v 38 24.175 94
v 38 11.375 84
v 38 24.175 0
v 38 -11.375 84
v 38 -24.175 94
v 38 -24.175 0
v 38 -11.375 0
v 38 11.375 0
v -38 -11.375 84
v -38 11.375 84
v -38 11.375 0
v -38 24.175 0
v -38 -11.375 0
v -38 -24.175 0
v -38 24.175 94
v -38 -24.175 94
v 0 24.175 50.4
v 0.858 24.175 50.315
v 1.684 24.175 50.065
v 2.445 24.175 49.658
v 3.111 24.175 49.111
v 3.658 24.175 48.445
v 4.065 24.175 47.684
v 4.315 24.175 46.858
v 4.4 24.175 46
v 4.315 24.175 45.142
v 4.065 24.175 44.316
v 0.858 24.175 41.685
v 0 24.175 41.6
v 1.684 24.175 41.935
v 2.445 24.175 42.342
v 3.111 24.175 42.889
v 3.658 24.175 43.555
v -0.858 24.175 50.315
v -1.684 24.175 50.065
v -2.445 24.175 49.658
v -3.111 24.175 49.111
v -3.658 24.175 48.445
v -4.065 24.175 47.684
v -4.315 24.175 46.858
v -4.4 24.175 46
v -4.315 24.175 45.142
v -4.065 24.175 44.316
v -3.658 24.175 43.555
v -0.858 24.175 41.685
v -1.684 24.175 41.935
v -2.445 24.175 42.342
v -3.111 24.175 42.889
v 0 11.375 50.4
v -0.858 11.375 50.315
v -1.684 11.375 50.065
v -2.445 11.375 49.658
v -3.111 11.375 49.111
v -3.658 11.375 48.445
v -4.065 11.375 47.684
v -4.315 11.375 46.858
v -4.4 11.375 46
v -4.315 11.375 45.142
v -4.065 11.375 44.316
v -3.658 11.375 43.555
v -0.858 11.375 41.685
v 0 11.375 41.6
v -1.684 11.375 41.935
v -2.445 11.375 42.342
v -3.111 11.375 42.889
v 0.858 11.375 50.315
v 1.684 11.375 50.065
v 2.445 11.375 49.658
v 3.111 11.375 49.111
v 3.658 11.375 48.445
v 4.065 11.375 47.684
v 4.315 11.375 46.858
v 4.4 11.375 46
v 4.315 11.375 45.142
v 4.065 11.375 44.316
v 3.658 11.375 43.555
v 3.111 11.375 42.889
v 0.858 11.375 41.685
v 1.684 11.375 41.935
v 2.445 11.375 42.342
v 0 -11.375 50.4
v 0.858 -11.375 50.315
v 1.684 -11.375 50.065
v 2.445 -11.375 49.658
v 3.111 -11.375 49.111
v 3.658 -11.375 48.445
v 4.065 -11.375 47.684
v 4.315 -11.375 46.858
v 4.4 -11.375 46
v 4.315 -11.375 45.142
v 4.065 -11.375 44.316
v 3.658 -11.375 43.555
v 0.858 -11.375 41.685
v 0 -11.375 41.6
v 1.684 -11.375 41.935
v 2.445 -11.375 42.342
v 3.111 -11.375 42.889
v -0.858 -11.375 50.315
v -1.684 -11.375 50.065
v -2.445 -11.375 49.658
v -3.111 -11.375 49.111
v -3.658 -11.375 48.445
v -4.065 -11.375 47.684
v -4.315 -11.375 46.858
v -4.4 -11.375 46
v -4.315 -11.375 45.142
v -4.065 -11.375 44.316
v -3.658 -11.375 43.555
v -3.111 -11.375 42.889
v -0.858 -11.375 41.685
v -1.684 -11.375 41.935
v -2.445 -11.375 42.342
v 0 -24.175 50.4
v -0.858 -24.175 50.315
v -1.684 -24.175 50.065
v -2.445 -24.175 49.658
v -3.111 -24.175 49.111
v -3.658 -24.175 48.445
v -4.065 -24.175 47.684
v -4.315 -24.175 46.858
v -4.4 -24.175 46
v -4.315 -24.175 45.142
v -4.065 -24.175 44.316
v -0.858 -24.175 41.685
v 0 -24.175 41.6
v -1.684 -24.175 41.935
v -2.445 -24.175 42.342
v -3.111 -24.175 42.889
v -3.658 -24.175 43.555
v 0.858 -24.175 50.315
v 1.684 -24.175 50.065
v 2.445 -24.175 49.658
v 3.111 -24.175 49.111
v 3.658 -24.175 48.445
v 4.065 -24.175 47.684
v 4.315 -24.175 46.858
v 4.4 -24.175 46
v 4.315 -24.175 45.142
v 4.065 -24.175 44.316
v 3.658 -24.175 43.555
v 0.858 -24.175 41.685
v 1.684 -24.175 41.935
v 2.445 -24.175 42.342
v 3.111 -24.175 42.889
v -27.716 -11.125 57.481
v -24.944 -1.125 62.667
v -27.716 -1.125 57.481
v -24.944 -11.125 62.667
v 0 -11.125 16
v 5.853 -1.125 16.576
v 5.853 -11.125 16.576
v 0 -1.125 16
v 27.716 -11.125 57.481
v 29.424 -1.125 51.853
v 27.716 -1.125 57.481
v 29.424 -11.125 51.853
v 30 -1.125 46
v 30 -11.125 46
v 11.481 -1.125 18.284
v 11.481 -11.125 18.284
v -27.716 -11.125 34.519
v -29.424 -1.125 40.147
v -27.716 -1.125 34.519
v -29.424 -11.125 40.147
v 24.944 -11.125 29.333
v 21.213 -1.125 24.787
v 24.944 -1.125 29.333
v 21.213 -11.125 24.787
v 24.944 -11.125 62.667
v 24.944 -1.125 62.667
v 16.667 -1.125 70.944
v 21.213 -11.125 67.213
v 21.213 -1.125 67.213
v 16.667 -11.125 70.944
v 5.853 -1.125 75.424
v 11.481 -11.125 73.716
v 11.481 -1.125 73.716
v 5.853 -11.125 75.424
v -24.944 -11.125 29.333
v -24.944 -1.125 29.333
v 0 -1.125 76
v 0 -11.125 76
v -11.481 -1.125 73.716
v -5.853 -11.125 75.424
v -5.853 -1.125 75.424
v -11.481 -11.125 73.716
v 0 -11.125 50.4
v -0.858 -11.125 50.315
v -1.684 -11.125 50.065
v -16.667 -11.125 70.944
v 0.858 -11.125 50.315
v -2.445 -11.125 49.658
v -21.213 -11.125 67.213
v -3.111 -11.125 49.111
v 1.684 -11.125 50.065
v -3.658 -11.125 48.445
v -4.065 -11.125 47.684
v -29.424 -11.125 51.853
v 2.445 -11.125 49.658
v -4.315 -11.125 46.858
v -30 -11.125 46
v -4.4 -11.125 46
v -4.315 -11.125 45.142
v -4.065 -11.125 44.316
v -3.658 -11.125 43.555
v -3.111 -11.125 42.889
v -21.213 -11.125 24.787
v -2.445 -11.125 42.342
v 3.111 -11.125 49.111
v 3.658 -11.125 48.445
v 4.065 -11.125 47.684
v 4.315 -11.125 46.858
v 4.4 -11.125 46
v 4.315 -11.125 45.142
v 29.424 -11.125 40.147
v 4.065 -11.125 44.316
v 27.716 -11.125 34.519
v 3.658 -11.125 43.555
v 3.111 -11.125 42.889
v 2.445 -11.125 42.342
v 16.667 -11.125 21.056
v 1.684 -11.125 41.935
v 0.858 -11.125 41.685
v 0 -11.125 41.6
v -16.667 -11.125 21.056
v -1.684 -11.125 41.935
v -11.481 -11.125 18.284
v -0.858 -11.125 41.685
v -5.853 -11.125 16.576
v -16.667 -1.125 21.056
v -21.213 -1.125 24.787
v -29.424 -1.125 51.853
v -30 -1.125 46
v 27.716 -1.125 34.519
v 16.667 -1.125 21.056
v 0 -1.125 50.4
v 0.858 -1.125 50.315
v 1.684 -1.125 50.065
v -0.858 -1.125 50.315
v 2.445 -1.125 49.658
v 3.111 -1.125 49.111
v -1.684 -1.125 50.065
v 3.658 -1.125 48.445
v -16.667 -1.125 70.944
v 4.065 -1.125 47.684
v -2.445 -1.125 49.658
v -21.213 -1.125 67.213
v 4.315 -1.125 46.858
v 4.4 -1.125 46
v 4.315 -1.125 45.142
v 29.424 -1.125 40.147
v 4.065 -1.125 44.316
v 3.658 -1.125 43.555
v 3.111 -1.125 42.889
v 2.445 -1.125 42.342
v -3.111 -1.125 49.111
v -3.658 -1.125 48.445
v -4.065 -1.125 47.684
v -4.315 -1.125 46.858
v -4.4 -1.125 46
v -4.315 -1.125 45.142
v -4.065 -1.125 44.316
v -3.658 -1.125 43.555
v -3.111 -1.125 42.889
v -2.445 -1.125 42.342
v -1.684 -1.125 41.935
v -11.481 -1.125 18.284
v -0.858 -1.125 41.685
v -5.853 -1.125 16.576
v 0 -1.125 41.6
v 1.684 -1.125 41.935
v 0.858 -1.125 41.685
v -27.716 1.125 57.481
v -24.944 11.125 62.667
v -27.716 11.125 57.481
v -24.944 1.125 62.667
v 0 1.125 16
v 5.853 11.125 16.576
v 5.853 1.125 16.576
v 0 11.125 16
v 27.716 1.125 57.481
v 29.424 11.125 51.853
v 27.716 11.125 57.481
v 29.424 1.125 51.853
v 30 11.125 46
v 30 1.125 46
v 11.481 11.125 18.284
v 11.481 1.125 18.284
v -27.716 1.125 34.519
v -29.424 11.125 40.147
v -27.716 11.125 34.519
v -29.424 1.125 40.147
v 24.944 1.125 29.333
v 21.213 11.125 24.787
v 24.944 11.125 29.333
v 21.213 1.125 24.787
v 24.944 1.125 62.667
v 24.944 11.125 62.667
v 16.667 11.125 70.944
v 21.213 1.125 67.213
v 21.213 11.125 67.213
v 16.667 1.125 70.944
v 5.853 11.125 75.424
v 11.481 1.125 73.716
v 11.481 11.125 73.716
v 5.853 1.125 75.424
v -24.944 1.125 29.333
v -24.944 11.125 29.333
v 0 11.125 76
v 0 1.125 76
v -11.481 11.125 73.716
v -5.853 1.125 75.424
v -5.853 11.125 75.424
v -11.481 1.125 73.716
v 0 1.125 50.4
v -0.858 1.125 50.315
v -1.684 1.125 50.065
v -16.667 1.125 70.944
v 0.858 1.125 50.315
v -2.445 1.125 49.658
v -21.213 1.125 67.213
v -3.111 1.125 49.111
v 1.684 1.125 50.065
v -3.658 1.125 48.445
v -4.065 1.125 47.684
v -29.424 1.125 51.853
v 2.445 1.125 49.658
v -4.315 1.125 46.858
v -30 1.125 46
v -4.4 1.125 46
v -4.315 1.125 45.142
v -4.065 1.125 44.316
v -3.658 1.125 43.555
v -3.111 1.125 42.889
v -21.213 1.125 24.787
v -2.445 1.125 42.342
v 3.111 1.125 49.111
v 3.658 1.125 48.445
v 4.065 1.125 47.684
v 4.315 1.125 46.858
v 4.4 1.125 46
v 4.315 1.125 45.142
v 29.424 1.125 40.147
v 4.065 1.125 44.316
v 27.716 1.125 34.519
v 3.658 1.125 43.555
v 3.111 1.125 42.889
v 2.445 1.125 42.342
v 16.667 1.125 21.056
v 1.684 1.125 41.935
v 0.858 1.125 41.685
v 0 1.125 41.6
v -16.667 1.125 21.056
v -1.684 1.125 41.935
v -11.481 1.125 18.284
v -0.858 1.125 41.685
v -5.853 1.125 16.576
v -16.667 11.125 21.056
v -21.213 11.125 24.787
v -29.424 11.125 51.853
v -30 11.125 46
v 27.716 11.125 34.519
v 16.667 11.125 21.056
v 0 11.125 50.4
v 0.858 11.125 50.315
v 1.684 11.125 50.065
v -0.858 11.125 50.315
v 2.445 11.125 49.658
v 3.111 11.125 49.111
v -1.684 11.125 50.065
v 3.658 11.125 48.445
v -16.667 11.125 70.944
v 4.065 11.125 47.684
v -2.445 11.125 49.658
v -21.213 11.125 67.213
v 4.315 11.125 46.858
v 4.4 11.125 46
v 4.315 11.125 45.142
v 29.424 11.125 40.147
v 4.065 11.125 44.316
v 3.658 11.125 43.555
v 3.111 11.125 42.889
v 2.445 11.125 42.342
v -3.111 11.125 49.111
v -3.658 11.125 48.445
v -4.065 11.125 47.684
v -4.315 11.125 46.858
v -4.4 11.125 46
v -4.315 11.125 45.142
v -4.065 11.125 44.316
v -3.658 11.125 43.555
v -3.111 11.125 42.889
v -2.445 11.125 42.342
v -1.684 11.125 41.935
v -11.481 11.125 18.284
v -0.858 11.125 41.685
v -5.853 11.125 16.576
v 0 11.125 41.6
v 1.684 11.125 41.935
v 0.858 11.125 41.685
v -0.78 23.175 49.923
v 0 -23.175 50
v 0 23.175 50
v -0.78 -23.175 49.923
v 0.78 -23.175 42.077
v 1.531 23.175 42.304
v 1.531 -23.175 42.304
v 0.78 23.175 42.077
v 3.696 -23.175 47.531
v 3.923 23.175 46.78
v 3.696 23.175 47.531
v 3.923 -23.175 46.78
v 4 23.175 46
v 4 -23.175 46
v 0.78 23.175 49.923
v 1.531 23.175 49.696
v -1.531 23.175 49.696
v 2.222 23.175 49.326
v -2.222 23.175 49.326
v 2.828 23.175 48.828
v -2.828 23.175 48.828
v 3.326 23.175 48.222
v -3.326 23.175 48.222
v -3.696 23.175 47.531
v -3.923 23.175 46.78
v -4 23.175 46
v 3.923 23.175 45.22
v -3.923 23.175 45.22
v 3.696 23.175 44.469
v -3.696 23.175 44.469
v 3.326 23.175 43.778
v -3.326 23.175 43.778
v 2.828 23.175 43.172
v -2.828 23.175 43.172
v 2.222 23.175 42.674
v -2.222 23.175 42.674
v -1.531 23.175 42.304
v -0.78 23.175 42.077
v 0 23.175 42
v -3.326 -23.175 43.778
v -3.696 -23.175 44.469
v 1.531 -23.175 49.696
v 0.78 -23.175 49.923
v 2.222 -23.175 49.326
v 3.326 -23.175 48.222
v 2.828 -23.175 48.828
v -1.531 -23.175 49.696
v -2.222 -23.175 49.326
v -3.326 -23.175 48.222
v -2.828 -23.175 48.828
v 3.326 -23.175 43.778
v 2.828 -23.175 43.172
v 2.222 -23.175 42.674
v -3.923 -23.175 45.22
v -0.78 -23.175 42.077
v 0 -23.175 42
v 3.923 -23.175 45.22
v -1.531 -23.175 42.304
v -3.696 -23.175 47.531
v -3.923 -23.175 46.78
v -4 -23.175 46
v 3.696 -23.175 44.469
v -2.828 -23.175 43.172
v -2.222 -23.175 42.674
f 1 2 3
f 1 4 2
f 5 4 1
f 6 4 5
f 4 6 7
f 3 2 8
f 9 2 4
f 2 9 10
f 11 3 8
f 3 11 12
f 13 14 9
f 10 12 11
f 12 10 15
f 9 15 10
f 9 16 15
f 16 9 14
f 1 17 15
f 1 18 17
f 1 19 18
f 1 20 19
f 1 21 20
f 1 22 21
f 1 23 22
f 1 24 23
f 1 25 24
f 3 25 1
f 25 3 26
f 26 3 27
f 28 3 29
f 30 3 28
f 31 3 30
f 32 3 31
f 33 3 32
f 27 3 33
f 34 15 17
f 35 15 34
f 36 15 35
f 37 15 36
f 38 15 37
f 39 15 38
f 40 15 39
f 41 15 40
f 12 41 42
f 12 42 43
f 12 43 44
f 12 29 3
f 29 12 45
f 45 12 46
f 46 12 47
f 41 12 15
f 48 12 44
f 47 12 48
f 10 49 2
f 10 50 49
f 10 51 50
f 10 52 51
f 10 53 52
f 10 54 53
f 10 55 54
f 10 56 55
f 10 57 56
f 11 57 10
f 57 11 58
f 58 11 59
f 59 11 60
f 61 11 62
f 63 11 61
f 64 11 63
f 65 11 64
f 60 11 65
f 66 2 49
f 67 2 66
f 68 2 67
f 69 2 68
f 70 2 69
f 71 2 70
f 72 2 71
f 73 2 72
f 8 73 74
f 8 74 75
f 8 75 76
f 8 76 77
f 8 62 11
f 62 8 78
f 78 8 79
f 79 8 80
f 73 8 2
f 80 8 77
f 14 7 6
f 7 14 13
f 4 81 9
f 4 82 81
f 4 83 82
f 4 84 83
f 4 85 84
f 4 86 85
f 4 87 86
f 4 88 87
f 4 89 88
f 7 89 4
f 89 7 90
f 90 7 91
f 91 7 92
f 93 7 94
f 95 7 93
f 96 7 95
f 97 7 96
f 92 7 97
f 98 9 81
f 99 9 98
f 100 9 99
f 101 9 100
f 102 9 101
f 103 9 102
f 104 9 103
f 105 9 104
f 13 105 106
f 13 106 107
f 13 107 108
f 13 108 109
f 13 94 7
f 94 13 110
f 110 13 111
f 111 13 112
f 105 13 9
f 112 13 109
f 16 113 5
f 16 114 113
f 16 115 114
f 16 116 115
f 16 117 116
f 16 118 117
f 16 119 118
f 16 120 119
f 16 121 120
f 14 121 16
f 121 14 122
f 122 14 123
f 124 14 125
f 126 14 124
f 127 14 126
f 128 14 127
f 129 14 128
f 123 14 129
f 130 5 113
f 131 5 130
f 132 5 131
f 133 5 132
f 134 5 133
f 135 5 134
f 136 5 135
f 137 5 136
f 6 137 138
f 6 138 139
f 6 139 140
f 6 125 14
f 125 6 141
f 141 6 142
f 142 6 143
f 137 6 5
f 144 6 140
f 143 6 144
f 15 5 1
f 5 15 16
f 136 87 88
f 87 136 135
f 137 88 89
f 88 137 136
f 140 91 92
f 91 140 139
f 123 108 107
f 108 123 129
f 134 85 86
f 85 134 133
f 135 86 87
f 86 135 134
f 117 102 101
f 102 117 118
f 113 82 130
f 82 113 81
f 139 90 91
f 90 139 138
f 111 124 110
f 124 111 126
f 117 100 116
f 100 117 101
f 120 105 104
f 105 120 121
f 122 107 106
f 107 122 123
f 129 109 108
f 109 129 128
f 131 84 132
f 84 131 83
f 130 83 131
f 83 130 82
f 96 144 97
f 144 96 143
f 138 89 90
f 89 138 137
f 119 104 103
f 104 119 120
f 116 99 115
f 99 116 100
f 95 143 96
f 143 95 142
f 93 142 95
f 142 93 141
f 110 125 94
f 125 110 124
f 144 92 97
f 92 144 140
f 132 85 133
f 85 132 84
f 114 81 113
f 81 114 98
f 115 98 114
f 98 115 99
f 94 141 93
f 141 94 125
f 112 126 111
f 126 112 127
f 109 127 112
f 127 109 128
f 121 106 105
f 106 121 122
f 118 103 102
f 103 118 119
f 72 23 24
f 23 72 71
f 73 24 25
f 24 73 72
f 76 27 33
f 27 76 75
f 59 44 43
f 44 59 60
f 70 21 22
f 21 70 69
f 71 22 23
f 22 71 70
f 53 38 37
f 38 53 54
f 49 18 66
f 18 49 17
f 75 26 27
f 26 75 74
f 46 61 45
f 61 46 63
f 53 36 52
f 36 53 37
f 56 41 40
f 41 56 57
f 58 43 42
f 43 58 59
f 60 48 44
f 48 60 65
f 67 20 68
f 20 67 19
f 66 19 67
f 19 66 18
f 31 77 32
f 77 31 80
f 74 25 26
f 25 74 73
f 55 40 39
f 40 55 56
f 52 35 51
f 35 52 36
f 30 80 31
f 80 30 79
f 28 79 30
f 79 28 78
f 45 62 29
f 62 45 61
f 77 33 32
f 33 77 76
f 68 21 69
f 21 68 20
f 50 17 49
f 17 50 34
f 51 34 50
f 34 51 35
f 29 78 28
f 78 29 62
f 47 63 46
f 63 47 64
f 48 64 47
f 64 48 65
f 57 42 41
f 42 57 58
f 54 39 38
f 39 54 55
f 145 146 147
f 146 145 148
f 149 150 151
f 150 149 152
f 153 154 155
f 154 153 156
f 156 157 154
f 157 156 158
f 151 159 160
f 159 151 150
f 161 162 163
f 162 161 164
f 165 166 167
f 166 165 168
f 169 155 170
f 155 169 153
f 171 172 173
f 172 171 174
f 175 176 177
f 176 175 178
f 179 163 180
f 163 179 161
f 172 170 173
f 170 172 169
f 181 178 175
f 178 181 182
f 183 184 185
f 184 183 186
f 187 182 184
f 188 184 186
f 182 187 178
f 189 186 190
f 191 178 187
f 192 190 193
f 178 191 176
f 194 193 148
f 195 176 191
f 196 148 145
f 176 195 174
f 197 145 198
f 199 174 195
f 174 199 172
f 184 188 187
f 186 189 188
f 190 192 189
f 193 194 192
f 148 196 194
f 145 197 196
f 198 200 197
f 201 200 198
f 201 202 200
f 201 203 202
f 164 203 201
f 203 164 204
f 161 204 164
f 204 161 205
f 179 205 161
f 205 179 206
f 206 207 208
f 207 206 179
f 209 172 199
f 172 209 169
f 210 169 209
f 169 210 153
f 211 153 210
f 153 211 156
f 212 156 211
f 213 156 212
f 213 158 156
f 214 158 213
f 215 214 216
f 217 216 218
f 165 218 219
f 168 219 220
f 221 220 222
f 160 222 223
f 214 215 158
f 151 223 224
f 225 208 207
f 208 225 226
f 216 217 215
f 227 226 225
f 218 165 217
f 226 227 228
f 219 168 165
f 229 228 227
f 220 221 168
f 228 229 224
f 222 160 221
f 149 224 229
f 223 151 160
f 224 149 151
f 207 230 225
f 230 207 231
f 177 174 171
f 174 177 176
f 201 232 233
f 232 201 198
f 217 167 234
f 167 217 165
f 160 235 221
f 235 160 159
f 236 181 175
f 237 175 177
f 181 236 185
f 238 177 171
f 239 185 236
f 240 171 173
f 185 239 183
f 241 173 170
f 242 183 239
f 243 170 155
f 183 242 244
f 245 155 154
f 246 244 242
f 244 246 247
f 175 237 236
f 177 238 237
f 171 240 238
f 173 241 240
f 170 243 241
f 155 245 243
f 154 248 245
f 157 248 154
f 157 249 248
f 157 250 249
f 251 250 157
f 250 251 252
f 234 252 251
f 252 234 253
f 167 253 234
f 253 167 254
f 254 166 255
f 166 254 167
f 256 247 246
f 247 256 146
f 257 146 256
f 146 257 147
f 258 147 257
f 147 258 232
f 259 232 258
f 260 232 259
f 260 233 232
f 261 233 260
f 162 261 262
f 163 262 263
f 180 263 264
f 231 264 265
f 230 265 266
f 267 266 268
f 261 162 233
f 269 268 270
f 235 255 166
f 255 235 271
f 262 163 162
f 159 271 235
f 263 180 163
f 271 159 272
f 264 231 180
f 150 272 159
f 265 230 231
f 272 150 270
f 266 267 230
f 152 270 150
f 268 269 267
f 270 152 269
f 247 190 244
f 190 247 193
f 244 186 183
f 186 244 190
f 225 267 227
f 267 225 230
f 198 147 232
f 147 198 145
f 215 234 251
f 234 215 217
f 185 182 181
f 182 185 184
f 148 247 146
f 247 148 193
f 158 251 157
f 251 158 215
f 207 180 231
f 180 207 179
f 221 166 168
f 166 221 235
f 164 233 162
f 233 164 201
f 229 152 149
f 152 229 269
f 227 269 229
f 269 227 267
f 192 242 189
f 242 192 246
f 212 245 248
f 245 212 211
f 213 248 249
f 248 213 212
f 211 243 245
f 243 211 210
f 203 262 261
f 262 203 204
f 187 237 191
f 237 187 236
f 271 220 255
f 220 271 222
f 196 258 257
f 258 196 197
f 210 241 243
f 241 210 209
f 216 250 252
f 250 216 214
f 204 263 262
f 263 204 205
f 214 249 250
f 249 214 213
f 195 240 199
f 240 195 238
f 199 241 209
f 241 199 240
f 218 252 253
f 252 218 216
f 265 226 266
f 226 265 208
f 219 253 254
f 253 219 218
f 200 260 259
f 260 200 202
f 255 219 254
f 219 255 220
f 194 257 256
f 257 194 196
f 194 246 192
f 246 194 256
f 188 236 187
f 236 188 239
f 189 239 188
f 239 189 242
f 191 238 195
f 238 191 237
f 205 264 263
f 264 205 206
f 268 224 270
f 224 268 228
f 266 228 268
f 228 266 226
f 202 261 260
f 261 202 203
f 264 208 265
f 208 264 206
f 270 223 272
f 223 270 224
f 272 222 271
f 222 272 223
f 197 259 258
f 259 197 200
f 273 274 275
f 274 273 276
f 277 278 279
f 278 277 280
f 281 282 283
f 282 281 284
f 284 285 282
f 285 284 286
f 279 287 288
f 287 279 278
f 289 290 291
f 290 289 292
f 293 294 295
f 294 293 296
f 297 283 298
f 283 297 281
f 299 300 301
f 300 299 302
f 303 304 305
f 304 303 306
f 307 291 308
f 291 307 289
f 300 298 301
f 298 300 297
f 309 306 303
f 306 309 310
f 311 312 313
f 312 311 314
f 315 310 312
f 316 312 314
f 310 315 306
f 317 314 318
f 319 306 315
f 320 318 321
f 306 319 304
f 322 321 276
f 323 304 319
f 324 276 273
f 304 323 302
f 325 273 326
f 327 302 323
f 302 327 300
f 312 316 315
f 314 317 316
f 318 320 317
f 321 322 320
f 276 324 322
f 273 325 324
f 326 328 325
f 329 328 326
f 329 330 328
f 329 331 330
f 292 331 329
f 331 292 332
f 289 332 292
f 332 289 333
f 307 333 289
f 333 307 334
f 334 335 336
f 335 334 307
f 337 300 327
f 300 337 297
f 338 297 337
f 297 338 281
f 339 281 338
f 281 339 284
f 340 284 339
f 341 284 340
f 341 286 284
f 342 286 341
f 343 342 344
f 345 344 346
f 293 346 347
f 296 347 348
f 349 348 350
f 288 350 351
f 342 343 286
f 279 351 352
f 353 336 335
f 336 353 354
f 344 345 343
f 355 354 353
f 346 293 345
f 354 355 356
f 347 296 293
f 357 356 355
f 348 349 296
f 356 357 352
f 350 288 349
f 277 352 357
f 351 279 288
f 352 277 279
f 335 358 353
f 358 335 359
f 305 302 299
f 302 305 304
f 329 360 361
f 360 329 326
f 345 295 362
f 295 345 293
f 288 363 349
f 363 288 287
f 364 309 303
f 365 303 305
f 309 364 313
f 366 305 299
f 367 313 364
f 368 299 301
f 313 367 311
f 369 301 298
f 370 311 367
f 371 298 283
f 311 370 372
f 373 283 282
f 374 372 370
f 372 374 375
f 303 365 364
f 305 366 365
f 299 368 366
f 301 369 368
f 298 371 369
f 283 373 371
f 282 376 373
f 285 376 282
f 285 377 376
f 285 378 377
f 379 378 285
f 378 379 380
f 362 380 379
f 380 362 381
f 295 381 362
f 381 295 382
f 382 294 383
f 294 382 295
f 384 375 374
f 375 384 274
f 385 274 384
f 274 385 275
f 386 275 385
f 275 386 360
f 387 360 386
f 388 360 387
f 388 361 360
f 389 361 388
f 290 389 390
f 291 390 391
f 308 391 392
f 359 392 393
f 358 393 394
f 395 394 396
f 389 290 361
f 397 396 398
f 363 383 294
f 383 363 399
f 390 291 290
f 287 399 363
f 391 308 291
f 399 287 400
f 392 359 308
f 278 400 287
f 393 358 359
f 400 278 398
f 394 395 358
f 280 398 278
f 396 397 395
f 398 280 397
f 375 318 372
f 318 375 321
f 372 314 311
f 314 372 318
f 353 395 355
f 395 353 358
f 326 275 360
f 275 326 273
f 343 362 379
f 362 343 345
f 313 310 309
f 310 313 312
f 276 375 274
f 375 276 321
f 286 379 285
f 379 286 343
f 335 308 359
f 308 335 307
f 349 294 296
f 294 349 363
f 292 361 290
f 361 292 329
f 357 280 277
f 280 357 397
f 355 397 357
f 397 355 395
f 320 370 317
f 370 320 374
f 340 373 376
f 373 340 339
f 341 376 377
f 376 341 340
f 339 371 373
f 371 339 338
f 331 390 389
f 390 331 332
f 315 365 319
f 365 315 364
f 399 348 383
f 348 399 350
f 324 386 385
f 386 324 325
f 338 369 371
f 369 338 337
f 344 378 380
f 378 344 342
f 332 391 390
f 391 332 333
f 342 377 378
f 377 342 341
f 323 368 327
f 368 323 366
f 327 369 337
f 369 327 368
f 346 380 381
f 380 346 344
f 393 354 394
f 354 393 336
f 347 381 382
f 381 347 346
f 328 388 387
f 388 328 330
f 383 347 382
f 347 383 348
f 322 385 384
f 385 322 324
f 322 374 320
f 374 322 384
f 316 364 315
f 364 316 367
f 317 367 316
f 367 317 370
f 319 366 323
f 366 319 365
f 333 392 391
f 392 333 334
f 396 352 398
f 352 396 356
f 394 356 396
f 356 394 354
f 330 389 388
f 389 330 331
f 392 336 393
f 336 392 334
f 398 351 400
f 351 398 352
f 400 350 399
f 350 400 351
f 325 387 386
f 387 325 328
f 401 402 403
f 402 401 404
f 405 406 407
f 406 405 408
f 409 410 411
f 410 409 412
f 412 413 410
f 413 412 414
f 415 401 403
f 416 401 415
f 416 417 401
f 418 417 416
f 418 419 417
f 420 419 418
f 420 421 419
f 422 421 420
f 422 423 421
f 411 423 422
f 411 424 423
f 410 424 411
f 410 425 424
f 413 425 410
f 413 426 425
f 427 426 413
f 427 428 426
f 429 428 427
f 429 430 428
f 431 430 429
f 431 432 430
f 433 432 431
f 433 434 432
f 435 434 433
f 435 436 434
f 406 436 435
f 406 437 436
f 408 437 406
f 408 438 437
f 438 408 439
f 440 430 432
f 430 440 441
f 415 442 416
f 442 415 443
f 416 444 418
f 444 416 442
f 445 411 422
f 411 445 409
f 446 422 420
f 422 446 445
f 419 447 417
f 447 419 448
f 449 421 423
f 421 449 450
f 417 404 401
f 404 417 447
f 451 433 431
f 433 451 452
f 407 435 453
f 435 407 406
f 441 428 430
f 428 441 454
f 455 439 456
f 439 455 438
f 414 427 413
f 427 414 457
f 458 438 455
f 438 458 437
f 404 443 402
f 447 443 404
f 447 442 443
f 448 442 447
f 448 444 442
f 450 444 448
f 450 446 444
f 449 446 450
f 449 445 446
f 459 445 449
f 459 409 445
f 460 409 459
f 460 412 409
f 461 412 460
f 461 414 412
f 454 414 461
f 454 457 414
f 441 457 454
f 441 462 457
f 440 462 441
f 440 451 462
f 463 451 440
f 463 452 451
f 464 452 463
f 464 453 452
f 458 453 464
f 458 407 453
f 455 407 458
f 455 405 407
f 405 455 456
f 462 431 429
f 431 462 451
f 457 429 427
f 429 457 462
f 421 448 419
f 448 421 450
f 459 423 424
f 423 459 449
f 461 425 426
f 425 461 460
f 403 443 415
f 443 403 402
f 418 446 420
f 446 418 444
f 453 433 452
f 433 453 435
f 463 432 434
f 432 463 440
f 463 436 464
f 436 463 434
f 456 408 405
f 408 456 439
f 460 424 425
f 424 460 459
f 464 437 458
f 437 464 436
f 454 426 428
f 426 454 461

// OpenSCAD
$fn = 32;

// ------------------------------------------------------------------------
// Trolley wheel set: wheels d60, fork 84 mm tall
// Every part is its own module, assembly() places every instance.
// ------------------------------------------------------------------------

// --- part 1 ---
module trolley_fork() {
  difference() {
    union() {
      translate([-38, 11.375, 0]) cube([76, 12.8, 84]);
      translate([-38, -24.175, 0]) cube([76, 12.8, 84]);
      translate([-38, -24.175, 84]) cube([76, 48.35, 10]);
    }
    translate([0, -17.775, 46]) rotate([90, 0, 0]) cylinder(h = 14.8, d = 8.8, center = true);
    translate([0, 17.775, 46]) rotate([90, 0, 0]) cylinder(h = 14.8, d = 8.8, center = true);
  }
}

// --- part 2 ---
module trolley_wheel() {
  difference() {
      translate([0, 0, 0]) cylinder(h = 10, d = 60);
      translate([0, 0, -1]) cylinder(h = 12, d = 8.8);
    }
}

// --- part 3 ---
module trolley_axle() {
  translate([0, 0, -23.175]) cylinder(h = 46.35, d = 8);
}

// --- assembly ---
module assembly() {
  color([0.80, 0.24, 0.20]) translate([0, 0, 0]) rotate([0, 0, 0]) trolley_fork();
  color([0.20, 0.45, 0.75]) translate([0, -1.125, 46]) rotate([90, 0, 0]) trolley_wheel();
  color([0.25, 0.62, 0.32]) translate([0, 11.125, 46]) rotate([90, 0, 0]) trolley_wheel();
  color([0.92, 0.70, 0.18]) translate([0, 0, 46]) rotate([90, 0, 0]) trolley_axle();
}

assembly();
